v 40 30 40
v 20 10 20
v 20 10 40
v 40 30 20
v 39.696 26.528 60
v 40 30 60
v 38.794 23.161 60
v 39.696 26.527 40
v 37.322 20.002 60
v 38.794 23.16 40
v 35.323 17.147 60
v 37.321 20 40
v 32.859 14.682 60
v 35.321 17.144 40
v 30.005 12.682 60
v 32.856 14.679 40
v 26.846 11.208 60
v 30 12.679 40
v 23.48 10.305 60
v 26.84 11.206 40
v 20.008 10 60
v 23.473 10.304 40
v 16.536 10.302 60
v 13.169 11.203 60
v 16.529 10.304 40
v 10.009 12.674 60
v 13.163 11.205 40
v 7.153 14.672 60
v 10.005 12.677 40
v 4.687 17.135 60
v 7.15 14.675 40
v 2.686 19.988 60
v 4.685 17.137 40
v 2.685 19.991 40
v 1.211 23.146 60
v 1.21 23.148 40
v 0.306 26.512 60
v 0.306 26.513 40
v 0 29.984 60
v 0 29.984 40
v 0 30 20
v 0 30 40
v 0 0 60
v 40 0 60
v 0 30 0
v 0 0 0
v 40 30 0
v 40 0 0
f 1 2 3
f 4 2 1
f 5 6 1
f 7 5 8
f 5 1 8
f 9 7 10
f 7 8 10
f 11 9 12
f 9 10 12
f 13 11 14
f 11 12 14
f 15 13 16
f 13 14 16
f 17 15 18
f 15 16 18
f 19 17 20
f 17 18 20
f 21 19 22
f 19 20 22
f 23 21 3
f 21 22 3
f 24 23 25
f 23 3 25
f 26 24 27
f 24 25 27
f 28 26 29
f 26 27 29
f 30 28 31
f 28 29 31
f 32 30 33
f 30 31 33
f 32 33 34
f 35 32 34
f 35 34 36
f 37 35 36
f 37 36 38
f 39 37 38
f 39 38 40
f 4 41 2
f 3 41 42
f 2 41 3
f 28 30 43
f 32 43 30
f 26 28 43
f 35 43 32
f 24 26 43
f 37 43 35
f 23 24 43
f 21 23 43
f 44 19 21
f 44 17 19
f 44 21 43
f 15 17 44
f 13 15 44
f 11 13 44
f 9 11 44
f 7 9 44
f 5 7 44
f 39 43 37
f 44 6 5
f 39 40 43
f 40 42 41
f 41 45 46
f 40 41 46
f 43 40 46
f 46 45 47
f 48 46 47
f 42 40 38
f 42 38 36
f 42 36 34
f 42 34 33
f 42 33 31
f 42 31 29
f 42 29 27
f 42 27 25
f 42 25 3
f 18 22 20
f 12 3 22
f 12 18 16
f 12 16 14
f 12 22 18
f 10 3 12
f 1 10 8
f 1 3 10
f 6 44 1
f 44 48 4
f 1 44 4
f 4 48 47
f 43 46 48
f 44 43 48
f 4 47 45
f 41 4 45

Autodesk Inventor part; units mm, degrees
ref_plane "YZ Plane" through (0, 0, 0) normal (1, 0, 0) x (0, 1, 0)
ref_plane "XZ Plane" through (0, 0, 0) normal (0, 1, 0) x (-1, 0, 0)
ref_plane "XY Plane" through (0, 0, 0) normal (0, 0, 1) x (1, 0, 0)
sketch "草圖1" plane through (0, 0, 0) normal (0, 0, 1) x (1, 0, 0)
  line L0 (0, 0) -> (40, 0)
  line L1 (40, 0) -> (40, 30)
  line L2 (40, 30) -> (0, 30)
  line L3 (0, 30) -> (0, 0)
  dimension "d0" = 40
  dimension "d1" = 30
extrude "擠出1" add sketch "草圖1" along normal blind 20
sketch "草圖2" plane through (0, 0, 20) normal (0, 0, 1) x (1, 0, 0)
  line L0 (0, 30) -> (0, 0) projected
  line L1 (0, 0) -> (40, 0) projected
  line L2 (40, 30) -> (40, 0)
  line L3 (40, 0) -> (0, 0)
  line L4 (0, 0) -> (0, 30)
  line L5 (40, 30) -> (0, 30) construction
  line L6 (0, 30) -> (20, 10)
  line L7 (20, 10) -> (40, 30)
  dimension "d4" = 20
  dimension "d5" = 20
extrude "擠出2" add sketch "草圖2" along normal blind 20
sketch "草圖3" plane through (0, 0, 40) normal (0, 0, 1) x (1, 0, 0)
  line L0 (40, 30) -> (20, 10) construction
  arc A0 (0, 29.9839) -> (40, 30) centre (20, 30) ccw
  line L1 (0, 30) -> (0, 0) projected
  line L2 (0, 29.9839) -> (0, 0)
  line L3 (0, 0) -> (40, 0)
  line L4 (40, 0) -> (40, 30) projected
  line L5 (40, 0) -> (40, 30)
extrude "擠出3" add sketch "草圖3" along normal blind 20
properties part number "38 (51433.628 mm^3)"
